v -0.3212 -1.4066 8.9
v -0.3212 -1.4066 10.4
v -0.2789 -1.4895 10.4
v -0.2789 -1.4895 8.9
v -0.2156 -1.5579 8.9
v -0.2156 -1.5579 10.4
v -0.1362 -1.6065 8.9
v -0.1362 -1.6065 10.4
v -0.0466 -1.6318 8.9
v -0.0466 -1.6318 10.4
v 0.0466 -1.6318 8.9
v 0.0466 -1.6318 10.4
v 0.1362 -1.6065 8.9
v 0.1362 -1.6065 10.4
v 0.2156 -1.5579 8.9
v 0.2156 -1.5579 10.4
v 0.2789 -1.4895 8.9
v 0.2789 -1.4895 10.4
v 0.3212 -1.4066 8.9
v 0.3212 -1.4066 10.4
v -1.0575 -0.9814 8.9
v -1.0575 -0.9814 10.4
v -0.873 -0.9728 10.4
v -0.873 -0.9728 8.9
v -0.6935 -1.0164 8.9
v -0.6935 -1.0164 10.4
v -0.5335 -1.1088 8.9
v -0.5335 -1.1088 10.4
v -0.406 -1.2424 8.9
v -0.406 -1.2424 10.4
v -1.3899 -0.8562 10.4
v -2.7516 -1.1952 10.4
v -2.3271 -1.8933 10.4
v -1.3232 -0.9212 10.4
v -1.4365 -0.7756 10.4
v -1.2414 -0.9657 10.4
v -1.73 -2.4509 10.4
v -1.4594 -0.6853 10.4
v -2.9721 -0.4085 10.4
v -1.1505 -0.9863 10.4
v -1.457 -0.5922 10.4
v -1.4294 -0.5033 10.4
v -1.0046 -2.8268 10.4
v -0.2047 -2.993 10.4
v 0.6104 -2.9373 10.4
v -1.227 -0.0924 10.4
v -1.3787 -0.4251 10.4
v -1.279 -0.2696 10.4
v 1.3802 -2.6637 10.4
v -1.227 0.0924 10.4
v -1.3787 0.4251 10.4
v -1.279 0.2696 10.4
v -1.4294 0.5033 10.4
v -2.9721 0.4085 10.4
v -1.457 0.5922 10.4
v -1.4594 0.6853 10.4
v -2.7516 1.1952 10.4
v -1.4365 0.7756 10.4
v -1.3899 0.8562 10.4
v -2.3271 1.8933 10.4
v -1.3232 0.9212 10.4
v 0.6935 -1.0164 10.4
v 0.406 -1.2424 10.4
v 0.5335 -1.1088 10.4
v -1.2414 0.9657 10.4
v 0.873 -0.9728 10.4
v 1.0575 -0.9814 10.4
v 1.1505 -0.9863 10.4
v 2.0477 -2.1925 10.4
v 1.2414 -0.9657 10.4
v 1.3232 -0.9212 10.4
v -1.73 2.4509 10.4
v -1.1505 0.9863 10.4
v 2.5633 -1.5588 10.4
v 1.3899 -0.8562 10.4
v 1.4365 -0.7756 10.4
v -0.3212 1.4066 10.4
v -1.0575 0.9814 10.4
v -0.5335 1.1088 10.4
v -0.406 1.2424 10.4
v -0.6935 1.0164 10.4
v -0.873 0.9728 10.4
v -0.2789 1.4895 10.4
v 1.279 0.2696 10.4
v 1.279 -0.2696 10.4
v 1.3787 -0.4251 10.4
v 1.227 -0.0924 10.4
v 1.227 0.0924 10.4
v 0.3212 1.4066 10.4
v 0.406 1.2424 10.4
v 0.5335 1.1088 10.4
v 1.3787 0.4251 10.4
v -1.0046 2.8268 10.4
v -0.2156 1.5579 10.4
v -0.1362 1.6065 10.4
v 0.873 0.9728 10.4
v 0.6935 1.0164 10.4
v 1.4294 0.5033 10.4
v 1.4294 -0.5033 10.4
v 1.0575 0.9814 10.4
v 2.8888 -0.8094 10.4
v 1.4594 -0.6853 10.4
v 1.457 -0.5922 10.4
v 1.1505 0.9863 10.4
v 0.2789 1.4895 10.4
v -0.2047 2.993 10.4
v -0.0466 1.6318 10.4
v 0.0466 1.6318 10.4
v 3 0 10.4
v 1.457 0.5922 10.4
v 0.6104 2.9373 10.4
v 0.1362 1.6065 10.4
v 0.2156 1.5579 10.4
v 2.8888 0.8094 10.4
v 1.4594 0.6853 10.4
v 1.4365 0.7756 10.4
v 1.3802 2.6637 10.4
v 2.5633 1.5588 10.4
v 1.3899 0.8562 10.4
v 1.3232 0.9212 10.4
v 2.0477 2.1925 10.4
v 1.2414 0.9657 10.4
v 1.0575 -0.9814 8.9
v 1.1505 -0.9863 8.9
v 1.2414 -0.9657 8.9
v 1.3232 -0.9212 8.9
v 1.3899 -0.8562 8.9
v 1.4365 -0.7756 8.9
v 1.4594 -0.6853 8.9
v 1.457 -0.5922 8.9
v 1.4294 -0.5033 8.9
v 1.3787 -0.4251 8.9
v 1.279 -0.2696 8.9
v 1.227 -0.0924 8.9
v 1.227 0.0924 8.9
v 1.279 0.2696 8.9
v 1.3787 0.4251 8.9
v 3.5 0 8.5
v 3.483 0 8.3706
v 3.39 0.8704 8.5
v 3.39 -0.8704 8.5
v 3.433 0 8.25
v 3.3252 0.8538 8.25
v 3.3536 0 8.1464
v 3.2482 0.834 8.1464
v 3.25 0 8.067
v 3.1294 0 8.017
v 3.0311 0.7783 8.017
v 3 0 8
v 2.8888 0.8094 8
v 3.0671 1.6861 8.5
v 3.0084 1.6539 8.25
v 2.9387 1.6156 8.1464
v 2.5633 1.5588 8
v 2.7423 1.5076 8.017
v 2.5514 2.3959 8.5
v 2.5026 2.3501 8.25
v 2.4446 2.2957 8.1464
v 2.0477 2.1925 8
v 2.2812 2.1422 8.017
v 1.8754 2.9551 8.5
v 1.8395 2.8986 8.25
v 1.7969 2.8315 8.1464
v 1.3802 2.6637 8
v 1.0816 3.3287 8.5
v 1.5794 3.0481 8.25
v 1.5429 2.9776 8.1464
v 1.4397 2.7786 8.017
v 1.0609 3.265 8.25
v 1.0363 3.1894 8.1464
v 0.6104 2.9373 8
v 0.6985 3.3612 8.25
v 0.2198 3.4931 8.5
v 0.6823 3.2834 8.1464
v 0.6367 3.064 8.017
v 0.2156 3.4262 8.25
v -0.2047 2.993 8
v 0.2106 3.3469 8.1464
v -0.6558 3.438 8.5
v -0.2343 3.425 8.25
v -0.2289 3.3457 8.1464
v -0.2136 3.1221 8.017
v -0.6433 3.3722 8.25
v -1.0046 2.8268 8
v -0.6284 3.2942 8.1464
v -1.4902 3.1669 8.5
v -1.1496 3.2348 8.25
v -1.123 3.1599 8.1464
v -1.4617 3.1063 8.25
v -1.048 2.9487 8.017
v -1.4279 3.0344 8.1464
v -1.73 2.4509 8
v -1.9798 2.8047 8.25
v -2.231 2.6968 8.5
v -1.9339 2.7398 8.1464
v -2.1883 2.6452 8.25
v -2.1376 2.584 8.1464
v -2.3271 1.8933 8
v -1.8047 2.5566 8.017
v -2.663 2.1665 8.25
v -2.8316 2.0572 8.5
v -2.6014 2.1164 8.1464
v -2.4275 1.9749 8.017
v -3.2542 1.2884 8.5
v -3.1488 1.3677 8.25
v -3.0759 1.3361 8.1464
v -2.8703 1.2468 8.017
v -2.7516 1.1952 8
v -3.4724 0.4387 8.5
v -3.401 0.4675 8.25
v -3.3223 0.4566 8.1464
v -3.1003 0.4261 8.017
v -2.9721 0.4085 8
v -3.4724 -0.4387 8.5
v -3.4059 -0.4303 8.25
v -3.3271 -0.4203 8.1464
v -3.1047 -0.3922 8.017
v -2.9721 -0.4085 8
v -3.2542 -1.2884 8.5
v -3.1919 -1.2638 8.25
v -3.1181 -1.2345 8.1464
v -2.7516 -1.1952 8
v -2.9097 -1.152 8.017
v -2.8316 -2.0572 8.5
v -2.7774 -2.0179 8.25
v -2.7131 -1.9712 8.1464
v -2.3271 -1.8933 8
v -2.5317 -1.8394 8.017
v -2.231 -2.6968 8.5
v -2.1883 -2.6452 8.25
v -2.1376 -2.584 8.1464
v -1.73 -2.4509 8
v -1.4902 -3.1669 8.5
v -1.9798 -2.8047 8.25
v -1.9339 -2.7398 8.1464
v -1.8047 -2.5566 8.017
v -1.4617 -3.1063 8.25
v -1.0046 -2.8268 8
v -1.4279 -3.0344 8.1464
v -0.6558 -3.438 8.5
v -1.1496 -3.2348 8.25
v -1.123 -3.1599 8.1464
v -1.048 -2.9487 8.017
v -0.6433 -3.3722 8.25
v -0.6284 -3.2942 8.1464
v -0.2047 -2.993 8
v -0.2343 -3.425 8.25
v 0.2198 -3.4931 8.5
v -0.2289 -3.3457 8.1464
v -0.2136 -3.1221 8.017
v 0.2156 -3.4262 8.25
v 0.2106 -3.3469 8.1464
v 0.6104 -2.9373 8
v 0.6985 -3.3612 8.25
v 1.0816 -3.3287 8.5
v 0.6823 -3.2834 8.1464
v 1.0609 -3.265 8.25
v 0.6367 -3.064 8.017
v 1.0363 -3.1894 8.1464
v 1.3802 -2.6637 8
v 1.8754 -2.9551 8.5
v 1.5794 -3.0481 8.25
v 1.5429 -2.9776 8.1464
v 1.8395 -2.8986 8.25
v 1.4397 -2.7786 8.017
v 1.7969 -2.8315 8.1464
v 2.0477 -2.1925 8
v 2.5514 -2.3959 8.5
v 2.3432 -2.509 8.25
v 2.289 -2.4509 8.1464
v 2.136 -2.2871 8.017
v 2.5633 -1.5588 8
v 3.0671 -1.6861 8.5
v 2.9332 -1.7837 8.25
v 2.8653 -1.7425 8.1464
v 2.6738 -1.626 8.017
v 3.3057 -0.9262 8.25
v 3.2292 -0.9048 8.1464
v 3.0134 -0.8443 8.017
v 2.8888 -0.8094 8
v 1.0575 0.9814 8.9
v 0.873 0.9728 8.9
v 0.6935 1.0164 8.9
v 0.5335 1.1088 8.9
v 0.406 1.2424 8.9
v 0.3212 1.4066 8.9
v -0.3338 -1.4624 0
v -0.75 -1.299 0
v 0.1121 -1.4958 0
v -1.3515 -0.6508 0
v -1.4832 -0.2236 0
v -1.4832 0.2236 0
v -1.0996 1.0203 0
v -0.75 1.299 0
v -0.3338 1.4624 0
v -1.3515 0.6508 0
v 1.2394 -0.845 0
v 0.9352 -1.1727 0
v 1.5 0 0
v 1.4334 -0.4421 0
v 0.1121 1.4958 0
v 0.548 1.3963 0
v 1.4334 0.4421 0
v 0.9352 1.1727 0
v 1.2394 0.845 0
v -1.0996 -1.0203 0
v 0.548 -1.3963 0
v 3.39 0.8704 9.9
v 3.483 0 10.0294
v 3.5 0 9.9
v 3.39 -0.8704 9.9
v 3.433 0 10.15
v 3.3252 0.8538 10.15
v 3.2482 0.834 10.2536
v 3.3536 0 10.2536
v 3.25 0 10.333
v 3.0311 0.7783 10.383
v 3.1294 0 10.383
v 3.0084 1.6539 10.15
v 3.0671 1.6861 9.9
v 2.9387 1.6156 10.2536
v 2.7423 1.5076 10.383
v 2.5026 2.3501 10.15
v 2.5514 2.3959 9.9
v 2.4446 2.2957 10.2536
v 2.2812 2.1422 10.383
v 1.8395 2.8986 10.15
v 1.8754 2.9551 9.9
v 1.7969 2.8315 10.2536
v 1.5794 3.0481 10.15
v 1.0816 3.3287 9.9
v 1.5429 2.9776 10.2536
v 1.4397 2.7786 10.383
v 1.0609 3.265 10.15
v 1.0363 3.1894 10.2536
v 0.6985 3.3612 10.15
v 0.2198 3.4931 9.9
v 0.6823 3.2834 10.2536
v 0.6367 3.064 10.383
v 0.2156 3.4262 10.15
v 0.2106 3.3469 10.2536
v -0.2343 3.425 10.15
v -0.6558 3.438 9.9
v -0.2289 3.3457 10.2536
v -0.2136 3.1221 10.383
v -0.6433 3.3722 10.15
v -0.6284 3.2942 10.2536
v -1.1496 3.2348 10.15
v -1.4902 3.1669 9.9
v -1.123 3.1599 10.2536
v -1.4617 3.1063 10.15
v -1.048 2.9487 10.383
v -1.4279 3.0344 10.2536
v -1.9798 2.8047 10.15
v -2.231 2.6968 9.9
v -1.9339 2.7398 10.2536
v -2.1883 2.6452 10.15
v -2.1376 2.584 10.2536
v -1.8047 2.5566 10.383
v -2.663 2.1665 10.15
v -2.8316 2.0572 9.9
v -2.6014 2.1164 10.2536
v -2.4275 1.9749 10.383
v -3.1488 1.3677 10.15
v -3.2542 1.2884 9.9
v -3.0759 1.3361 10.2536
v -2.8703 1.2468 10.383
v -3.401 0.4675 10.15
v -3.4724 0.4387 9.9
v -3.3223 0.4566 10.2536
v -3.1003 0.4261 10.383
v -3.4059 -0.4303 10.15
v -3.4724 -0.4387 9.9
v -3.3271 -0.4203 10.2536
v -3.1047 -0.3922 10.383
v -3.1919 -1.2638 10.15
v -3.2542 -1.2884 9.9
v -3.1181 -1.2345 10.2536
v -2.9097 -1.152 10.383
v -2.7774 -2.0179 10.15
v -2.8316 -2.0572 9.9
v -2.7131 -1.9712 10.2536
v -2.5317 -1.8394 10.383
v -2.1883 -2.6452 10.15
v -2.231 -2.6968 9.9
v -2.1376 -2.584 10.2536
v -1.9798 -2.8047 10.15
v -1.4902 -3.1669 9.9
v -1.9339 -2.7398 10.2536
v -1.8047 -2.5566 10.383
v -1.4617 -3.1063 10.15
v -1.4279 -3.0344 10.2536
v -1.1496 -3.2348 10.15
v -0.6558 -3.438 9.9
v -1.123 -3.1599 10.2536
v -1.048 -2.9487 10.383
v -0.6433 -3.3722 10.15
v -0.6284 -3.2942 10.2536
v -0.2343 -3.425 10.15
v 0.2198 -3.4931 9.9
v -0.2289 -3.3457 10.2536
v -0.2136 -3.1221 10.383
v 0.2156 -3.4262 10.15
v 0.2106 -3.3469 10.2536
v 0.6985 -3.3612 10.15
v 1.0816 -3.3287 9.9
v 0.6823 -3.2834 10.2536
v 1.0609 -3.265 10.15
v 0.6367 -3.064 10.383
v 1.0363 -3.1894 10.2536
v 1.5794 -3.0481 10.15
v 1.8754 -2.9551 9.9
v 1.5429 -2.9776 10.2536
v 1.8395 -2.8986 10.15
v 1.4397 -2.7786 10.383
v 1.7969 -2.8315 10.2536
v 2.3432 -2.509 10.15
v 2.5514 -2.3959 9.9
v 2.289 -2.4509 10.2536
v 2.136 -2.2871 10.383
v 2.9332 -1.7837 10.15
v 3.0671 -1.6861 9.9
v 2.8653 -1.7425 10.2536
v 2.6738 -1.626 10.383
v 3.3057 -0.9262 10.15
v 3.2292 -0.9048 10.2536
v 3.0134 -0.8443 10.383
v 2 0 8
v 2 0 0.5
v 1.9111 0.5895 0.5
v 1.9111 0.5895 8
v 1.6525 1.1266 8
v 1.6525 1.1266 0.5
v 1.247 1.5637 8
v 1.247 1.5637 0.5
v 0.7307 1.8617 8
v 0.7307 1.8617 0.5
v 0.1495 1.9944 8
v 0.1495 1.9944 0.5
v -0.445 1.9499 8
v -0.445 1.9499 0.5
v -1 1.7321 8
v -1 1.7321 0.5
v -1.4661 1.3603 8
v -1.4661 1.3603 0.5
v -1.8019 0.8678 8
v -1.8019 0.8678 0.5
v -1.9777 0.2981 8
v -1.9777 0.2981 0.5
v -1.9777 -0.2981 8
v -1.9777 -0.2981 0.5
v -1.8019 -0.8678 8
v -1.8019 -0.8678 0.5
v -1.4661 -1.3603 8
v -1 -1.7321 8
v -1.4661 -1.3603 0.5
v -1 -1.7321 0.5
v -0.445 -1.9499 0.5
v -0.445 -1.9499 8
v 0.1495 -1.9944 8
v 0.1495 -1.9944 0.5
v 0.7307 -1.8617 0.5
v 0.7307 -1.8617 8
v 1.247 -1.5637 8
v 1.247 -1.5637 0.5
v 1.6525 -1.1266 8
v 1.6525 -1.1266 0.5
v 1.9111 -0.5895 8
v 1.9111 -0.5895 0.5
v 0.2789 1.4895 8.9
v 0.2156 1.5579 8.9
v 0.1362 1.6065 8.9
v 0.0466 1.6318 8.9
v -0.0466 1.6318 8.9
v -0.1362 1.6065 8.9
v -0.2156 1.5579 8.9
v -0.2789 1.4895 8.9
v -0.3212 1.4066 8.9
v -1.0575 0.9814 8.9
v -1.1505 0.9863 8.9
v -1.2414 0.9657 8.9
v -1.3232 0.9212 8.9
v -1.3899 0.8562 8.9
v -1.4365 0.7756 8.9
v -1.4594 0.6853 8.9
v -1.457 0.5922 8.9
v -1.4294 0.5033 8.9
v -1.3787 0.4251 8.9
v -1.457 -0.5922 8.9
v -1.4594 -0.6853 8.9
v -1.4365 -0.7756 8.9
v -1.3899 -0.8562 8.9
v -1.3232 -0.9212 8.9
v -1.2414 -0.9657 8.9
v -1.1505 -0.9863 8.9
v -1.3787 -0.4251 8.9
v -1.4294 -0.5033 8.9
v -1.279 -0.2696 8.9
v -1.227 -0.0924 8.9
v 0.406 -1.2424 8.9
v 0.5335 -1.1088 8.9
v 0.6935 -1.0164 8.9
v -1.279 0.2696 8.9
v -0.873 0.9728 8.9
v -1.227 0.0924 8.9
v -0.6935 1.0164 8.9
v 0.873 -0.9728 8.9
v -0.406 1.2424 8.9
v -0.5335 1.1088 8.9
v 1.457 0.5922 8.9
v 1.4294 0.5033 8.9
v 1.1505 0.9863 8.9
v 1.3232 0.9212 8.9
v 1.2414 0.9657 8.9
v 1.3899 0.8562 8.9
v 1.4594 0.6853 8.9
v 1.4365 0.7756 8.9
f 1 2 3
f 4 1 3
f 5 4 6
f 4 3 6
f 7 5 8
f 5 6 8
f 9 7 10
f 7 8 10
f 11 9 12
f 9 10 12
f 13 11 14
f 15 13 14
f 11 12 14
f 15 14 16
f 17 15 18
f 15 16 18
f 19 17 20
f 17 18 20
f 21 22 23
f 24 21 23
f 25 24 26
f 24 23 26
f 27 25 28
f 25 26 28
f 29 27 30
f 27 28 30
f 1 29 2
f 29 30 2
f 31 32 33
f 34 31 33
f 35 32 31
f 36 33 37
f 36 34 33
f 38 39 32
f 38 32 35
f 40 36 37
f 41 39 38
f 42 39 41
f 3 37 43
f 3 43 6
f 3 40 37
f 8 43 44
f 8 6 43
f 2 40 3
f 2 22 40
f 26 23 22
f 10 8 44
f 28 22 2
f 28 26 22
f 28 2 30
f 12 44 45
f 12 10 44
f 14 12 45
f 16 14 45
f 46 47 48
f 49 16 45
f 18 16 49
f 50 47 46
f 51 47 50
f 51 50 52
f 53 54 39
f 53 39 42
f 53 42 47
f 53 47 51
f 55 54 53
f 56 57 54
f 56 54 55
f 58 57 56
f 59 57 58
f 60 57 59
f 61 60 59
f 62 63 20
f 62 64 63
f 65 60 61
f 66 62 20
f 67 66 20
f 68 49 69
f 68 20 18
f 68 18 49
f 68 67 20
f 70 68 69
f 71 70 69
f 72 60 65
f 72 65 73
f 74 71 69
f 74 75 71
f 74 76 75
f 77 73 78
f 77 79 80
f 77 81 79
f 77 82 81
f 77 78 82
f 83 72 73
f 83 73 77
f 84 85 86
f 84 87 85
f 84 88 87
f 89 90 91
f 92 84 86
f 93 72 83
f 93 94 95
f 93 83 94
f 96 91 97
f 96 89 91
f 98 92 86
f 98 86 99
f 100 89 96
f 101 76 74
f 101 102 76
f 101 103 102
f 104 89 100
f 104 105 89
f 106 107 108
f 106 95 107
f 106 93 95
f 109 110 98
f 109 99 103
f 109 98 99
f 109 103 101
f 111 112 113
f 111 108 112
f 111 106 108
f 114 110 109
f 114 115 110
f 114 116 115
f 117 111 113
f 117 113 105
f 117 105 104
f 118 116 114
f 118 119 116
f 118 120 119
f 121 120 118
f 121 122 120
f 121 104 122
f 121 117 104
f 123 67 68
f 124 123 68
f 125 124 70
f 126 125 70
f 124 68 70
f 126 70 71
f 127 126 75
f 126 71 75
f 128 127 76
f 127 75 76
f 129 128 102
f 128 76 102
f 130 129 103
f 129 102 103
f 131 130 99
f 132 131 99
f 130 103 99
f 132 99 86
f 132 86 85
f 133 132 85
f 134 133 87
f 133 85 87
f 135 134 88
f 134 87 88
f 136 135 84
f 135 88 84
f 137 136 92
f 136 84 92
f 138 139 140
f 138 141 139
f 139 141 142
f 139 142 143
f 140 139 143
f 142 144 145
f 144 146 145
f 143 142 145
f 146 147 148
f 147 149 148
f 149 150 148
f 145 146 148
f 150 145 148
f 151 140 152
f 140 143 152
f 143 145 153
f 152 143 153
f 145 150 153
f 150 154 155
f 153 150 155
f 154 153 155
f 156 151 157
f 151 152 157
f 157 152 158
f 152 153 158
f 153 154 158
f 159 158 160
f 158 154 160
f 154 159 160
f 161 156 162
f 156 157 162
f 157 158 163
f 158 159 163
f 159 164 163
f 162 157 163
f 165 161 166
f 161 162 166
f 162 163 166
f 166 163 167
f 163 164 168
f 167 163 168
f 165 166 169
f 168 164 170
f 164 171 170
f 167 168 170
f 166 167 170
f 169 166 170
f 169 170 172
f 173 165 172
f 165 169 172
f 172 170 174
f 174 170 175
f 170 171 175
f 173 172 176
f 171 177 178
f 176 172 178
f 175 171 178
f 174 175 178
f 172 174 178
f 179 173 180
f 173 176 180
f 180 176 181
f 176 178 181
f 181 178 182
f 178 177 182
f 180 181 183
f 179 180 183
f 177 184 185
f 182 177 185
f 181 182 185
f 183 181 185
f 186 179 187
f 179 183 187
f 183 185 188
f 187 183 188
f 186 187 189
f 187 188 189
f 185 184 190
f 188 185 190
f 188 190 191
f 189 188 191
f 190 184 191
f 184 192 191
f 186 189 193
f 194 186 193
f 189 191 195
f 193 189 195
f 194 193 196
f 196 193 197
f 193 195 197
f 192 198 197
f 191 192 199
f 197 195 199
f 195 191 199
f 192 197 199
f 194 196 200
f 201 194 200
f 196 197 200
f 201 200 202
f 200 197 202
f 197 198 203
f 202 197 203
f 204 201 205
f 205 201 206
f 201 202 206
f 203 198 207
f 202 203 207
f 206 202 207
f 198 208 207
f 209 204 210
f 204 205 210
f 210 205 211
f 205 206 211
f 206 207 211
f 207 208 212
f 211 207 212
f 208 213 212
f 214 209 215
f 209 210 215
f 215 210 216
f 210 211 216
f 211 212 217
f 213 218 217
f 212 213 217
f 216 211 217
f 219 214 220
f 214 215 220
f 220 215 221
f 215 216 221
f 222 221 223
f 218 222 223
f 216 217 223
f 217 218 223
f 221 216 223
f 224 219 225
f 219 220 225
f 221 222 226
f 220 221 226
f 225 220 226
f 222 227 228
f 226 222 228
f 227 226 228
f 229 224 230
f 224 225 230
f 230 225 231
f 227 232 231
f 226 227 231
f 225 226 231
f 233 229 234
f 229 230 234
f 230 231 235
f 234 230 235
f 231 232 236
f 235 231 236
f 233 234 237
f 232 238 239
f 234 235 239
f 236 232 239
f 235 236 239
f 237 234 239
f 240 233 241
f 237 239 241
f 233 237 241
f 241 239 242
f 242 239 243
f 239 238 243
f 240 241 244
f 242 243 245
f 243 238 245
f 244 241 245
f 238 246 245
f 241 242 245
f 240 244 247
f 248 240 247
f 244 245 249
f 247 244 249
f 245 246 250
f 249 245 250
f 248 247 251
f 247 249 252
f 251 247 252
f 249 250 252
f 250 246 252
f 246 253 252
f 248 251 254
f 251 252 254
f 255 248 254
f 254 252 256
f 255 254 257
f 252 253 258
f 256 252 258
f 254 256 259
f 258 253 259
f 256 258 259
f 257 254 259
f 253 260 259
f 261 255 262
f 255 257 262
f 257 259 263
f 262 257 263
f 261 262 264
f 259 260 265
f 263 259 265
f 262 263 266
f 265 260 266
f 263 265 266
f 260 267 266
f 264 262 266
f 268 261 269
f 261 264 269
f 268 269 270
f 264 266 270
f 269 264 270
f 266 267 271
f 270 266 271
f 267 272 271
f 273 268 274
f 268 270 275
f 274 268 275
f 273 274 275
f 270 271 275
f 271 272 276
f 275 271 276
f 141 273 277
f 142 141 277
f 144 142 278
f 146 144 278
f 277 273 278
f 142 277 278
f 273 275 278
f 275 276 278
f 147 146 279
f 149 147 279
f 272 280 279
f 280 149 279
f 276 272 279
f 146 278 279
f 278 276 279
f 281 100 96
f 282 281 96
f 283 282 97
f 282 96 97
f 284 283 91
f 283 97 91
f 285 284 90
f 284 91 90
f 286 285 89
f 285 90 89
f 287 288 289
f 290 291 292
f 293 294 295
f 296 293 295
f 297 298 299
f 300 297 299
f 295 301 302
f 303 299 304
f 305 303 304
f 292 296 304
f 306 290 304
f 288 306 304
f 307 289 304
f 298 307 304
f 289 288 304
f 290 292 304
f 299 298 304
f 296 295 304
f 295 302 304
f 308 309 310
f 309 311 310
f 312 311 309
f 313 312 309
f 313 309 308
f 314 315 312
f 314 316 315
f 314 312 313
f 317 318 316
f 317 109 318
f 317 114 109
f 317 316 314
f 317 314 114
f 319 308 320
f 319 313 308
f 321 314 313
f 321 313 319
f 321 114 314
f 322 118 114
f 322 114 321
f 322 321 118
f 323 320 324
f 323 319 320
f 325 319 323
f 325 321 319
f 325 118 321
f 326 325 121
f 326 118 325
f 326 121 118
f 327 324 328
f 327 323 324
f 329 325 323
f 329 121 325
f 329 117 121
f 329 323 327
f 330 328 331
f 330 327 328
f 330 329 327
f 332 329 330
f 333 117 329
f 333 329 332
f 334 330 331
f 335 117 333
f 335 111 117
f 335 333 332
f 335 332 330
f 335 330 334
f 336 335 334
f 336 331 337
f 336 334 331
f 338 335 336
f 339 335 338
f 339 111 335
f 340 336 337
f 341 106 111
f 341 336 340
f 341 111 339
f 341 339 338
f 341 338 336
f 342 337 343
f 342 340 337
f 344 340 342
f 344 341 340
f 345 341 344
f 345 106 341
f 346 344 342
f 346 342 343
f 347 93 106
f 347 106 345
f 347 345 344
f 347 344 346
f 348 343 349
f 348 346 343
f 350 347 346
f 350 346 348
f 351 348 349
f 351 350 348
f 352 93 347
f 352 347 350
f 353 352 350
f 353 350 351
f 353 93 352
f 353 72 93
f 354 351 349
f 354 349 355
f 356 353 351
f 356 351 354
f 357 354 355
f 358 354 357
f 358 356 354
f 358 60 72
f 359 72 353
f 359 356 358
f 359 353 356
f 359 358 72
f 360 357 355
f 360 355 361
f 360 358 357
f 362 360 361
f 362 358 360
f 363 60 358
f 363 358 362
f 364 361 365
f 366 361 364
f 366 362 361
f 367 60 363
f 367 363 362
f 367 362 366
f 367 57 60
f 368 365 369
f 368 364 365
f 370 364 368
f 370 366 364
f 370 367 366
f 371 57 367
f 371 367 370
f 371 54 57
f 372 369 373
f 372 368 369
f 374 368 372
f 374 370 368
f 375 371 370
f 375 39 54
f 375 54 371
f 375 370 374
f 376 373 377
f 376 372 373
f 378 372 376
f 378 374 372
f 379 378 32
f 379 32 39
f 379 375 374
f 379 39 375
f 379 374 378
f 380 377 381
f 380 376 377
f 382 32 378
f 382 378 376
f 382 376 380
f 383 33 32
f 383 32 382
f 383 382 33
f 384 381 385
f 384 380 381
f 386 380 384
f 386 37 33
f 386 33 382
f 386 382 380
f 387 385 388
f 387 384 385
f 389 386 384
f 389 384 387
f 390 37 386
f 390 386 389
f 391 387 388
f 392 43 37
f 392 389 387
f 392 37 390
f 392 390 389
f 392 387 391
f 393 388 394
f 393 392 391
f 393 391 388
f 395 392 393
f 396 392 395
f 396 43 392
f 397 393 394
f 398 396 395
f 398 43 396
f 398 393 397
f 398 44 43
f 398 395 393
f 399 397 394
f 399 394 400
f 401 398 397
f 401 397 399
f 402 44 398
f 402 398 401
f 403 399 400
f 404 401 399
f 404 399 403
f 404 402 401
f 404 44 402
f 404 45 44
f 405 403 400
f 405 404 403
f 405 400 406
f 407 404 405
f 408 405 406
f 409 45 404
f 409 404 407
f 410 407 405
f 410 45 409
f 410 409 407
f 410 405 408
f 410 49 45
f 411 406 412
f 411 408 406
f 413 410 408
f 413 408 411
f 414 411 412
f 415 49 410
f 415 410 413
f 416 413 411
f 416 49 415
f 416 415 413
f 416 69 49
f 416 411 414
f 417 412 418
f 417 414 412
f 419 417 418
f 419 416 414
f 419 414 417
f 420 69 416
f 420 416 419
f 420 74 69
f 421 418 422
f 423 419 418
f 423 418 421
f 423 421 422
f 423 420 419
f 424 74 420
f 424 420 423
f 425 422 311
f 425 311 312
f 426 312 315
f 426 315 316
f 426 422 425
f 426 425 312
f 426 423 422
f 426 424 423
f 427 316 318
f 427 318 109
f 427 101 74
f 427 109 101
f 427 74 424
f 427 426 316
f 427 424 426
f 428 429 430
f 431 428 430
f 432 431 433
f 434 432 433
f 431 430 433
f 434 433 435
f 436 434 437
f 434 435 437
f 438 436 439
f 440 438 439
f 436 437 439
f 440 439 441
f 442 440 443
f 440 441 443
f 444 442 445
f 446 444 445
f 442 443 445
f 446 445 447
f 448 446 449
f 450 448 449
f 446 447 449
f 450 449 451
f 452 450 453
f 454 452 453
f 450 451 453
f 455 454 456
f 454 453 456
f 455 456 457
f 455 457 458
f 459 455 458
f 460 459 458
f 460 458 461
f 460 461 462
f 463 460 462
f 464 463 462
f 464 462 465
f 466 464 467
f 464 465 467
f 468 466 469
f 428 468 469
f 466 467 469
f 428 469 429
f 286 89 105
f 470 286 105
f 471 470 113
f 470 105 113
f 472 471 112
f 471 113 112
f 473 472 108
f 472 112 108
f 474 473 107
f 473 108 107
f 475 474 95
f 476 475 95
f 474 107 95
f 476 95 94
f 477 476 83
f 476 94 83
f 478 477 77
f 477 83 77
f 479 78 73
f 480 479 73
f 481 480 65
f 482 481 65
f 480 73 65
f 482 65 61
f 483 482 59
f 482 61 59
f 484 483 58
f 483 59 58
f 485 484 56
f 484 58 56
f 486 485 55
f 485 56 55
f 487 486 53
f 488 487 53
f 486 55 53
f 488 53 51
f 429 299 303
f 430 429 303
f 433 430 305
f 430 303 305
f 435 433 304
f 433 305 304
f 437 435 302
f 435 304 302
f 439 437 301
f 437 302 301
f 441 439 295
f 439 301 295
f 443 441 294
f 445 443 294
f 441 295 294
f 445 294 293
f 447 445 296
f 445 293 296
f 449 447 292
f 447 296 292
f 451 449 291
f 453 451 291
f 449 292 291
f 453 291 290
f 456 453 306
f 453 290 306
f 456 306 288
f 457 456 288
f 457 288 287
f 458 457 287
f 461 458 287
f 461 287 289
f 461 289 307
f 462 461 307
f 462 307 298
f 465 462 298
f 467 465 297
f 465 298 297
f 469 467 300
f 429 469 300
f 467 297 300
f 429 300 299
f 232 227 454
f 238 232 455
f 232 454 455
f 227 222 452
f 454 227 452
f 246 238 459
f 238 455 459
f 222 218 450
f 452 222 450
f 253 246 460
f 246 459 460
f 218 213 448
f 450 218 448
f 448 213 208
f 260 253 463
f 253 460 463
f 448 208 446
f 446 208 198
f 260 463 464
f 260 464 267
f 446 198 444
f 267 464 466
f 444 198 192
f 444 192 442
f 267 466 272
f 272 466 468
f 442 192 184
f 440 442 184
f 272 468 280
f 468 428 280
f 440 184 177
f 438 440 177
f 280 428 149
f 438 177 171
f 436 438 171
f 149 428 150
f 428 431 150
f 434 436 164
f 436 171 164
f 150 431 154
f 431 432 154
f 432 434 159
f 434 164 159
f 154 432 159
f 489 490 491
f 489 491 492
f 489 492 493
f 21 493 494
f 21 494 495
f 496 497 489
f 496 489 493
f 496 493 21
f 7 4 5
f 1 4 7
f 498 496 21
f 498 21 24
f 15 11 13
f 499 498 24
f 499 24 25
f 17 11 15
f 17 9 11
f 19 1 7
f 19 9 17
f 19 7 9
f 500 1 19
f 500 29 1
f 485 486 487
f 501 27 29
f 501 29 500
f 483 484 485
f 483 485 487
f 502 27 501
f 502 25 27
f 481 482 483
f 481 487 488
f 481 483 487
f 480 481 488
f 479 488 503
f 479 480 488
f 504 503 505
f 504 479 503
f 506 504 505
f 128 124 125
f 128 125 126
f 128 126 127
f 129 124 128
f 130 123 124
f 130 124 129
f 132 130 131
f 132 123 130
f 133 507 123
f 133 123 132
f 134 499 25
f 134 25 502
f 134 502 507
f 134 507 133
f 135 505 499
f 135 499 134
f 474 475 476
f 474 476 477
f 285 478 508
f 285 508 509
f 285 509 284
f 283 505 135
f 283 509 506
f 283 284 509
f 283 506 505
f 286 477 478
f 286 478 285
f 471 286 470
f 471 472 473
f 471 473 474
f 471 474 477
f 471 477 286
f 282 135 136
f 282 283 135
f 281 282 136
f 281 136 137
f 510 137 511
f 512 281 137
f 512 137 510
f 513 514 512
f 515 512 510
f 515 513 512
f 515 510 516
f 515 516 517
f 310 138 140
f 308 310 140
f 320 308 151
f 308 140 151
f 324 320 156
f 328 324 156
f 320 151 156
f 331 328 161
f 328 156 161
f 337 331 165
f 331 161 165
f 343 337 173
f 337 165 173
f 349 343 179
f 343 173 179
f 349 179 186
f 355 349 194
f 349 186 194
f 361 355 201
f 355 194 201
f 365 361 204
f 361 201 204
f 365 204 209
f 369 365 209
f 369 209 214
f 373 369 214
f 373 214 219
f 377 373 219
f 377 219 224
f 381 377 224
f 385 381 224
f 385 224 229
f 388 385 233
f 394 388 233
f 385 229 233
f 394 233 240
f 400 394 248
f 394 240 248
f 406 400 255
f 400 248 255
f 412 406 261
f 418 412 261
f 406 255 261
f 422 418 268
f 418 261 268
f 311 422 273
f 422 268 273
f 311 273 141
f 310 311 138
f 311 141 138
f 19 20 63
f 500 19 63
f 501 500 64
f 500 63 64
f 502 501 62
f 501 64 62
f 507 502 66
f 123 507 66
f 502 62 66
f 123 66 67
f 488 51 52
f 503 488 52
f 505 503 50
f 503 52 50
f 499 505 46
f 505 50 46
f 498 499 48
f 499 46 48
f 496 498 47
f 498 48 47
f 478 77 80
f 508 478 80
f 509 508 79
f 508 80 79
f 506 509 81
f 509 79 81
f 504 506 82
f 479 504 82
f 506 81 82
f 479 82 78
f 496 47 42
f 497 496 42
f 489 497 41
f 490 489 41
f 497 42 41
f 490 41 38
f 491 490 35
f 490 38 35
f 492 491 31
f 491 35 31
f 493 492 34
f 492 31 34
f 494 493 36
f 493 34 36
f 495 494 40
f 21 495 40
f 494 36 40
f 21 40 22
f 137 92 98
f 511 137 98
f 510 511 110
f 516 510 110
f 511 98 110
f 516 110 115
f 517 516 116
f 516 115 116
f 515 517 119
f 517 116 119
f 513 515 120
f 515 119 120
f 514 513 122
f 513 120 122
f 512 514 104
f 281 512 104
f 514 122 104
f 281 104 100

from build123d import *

# Parameters (mm, degrees)
F0_R     = 2
F1_DEPTH = 8
F2_R     = 3.5
F3_DEPTH = 2.4
F4_R     = 0.5
F5_SIZE  = 0.5
F7_DEPTH = 1.5


with BuildPart() as f1:
    # F0 (on Top) → F1 (new body)
    with BuildSketch(Plane.XY):
        Circle(F0_R)
    extrude(amount=F1_DEPTH)

    # F2 (on face) → F3 (join)
    with BuildSketch(Plane.XY.offset(8)):
        Circle(F2_R)
    extrude(amount=F3_DEPTH)

    # F4
    f4_edges = [f1.edges().sort_by_distance(p)[0] for p in [
        (-3.5, 0, 10.4),
        (-3.5, 0, 8),
    ]]
    fillet(f4_edges, radius=F4_R)

    # F5
    f5_edges = [f1.edges().sort_by_distance(p)[0] for p in [
        (-2, 0, 0),
    ]]
    chamfer(f5_edges, length=F5_SIZE)

    # F6 (on face) → F7 (cut)
    with BuildSketch(Plane.XY.offset(10.4)):
        with BuildLine():
            ThreePointArc((1.05752, 0.981425), (0.610199, 1.056896), (0.321179, 1.406552))
            ThreePointArc((0.321179, 1.406552), (0, 1.635), (-0.321179, 1.406552))
            ThreePointArc((-0.321179, 1.406552), (-0.610199, 1.056896), (-1.05752, 0.981425))
            ThreePointArc((-1.05752, 0.981425), (-1.415952, 0.8175), (-1.378699, 0.425126))
            ThreePointArc((-1.378699, 0.425126), (-1.220398, 0), (-1.378699, -0.425126))
            ThreePointArc((-1.378699, -0.425126), (-1.415952, -0.8175), (-1.05752, -0.981425))
            ThreePointArc((-1.05752, -0.981425), (-0.610199, -1.056896), (-0.321179, -1.406552))
            ThreePointArc((-0.321179, -1.406552), (0, -1.635), (0.321179, -1.406552))
            ThreePointArc((0.321179, -1.406552), (0.610199, -1.056896), (1.05752, -0.981425))
            ThreePointArc((1.05752, -0.981425), (1.415952, -0.8175), (1.378699, -0.425126))
            ThreePointArc((1.378699, -0.425126), (1.220398, 0), (1.378699, 0.425126))
            ThreePointArc((1.378699, 0.425126), (1.415952, 0.8175), (1.05752, 0.981425))
        make_face()
    extrude(amount=-F7_DEPTH, mode=Mode.SUBTRACT)


solid = f1.part
